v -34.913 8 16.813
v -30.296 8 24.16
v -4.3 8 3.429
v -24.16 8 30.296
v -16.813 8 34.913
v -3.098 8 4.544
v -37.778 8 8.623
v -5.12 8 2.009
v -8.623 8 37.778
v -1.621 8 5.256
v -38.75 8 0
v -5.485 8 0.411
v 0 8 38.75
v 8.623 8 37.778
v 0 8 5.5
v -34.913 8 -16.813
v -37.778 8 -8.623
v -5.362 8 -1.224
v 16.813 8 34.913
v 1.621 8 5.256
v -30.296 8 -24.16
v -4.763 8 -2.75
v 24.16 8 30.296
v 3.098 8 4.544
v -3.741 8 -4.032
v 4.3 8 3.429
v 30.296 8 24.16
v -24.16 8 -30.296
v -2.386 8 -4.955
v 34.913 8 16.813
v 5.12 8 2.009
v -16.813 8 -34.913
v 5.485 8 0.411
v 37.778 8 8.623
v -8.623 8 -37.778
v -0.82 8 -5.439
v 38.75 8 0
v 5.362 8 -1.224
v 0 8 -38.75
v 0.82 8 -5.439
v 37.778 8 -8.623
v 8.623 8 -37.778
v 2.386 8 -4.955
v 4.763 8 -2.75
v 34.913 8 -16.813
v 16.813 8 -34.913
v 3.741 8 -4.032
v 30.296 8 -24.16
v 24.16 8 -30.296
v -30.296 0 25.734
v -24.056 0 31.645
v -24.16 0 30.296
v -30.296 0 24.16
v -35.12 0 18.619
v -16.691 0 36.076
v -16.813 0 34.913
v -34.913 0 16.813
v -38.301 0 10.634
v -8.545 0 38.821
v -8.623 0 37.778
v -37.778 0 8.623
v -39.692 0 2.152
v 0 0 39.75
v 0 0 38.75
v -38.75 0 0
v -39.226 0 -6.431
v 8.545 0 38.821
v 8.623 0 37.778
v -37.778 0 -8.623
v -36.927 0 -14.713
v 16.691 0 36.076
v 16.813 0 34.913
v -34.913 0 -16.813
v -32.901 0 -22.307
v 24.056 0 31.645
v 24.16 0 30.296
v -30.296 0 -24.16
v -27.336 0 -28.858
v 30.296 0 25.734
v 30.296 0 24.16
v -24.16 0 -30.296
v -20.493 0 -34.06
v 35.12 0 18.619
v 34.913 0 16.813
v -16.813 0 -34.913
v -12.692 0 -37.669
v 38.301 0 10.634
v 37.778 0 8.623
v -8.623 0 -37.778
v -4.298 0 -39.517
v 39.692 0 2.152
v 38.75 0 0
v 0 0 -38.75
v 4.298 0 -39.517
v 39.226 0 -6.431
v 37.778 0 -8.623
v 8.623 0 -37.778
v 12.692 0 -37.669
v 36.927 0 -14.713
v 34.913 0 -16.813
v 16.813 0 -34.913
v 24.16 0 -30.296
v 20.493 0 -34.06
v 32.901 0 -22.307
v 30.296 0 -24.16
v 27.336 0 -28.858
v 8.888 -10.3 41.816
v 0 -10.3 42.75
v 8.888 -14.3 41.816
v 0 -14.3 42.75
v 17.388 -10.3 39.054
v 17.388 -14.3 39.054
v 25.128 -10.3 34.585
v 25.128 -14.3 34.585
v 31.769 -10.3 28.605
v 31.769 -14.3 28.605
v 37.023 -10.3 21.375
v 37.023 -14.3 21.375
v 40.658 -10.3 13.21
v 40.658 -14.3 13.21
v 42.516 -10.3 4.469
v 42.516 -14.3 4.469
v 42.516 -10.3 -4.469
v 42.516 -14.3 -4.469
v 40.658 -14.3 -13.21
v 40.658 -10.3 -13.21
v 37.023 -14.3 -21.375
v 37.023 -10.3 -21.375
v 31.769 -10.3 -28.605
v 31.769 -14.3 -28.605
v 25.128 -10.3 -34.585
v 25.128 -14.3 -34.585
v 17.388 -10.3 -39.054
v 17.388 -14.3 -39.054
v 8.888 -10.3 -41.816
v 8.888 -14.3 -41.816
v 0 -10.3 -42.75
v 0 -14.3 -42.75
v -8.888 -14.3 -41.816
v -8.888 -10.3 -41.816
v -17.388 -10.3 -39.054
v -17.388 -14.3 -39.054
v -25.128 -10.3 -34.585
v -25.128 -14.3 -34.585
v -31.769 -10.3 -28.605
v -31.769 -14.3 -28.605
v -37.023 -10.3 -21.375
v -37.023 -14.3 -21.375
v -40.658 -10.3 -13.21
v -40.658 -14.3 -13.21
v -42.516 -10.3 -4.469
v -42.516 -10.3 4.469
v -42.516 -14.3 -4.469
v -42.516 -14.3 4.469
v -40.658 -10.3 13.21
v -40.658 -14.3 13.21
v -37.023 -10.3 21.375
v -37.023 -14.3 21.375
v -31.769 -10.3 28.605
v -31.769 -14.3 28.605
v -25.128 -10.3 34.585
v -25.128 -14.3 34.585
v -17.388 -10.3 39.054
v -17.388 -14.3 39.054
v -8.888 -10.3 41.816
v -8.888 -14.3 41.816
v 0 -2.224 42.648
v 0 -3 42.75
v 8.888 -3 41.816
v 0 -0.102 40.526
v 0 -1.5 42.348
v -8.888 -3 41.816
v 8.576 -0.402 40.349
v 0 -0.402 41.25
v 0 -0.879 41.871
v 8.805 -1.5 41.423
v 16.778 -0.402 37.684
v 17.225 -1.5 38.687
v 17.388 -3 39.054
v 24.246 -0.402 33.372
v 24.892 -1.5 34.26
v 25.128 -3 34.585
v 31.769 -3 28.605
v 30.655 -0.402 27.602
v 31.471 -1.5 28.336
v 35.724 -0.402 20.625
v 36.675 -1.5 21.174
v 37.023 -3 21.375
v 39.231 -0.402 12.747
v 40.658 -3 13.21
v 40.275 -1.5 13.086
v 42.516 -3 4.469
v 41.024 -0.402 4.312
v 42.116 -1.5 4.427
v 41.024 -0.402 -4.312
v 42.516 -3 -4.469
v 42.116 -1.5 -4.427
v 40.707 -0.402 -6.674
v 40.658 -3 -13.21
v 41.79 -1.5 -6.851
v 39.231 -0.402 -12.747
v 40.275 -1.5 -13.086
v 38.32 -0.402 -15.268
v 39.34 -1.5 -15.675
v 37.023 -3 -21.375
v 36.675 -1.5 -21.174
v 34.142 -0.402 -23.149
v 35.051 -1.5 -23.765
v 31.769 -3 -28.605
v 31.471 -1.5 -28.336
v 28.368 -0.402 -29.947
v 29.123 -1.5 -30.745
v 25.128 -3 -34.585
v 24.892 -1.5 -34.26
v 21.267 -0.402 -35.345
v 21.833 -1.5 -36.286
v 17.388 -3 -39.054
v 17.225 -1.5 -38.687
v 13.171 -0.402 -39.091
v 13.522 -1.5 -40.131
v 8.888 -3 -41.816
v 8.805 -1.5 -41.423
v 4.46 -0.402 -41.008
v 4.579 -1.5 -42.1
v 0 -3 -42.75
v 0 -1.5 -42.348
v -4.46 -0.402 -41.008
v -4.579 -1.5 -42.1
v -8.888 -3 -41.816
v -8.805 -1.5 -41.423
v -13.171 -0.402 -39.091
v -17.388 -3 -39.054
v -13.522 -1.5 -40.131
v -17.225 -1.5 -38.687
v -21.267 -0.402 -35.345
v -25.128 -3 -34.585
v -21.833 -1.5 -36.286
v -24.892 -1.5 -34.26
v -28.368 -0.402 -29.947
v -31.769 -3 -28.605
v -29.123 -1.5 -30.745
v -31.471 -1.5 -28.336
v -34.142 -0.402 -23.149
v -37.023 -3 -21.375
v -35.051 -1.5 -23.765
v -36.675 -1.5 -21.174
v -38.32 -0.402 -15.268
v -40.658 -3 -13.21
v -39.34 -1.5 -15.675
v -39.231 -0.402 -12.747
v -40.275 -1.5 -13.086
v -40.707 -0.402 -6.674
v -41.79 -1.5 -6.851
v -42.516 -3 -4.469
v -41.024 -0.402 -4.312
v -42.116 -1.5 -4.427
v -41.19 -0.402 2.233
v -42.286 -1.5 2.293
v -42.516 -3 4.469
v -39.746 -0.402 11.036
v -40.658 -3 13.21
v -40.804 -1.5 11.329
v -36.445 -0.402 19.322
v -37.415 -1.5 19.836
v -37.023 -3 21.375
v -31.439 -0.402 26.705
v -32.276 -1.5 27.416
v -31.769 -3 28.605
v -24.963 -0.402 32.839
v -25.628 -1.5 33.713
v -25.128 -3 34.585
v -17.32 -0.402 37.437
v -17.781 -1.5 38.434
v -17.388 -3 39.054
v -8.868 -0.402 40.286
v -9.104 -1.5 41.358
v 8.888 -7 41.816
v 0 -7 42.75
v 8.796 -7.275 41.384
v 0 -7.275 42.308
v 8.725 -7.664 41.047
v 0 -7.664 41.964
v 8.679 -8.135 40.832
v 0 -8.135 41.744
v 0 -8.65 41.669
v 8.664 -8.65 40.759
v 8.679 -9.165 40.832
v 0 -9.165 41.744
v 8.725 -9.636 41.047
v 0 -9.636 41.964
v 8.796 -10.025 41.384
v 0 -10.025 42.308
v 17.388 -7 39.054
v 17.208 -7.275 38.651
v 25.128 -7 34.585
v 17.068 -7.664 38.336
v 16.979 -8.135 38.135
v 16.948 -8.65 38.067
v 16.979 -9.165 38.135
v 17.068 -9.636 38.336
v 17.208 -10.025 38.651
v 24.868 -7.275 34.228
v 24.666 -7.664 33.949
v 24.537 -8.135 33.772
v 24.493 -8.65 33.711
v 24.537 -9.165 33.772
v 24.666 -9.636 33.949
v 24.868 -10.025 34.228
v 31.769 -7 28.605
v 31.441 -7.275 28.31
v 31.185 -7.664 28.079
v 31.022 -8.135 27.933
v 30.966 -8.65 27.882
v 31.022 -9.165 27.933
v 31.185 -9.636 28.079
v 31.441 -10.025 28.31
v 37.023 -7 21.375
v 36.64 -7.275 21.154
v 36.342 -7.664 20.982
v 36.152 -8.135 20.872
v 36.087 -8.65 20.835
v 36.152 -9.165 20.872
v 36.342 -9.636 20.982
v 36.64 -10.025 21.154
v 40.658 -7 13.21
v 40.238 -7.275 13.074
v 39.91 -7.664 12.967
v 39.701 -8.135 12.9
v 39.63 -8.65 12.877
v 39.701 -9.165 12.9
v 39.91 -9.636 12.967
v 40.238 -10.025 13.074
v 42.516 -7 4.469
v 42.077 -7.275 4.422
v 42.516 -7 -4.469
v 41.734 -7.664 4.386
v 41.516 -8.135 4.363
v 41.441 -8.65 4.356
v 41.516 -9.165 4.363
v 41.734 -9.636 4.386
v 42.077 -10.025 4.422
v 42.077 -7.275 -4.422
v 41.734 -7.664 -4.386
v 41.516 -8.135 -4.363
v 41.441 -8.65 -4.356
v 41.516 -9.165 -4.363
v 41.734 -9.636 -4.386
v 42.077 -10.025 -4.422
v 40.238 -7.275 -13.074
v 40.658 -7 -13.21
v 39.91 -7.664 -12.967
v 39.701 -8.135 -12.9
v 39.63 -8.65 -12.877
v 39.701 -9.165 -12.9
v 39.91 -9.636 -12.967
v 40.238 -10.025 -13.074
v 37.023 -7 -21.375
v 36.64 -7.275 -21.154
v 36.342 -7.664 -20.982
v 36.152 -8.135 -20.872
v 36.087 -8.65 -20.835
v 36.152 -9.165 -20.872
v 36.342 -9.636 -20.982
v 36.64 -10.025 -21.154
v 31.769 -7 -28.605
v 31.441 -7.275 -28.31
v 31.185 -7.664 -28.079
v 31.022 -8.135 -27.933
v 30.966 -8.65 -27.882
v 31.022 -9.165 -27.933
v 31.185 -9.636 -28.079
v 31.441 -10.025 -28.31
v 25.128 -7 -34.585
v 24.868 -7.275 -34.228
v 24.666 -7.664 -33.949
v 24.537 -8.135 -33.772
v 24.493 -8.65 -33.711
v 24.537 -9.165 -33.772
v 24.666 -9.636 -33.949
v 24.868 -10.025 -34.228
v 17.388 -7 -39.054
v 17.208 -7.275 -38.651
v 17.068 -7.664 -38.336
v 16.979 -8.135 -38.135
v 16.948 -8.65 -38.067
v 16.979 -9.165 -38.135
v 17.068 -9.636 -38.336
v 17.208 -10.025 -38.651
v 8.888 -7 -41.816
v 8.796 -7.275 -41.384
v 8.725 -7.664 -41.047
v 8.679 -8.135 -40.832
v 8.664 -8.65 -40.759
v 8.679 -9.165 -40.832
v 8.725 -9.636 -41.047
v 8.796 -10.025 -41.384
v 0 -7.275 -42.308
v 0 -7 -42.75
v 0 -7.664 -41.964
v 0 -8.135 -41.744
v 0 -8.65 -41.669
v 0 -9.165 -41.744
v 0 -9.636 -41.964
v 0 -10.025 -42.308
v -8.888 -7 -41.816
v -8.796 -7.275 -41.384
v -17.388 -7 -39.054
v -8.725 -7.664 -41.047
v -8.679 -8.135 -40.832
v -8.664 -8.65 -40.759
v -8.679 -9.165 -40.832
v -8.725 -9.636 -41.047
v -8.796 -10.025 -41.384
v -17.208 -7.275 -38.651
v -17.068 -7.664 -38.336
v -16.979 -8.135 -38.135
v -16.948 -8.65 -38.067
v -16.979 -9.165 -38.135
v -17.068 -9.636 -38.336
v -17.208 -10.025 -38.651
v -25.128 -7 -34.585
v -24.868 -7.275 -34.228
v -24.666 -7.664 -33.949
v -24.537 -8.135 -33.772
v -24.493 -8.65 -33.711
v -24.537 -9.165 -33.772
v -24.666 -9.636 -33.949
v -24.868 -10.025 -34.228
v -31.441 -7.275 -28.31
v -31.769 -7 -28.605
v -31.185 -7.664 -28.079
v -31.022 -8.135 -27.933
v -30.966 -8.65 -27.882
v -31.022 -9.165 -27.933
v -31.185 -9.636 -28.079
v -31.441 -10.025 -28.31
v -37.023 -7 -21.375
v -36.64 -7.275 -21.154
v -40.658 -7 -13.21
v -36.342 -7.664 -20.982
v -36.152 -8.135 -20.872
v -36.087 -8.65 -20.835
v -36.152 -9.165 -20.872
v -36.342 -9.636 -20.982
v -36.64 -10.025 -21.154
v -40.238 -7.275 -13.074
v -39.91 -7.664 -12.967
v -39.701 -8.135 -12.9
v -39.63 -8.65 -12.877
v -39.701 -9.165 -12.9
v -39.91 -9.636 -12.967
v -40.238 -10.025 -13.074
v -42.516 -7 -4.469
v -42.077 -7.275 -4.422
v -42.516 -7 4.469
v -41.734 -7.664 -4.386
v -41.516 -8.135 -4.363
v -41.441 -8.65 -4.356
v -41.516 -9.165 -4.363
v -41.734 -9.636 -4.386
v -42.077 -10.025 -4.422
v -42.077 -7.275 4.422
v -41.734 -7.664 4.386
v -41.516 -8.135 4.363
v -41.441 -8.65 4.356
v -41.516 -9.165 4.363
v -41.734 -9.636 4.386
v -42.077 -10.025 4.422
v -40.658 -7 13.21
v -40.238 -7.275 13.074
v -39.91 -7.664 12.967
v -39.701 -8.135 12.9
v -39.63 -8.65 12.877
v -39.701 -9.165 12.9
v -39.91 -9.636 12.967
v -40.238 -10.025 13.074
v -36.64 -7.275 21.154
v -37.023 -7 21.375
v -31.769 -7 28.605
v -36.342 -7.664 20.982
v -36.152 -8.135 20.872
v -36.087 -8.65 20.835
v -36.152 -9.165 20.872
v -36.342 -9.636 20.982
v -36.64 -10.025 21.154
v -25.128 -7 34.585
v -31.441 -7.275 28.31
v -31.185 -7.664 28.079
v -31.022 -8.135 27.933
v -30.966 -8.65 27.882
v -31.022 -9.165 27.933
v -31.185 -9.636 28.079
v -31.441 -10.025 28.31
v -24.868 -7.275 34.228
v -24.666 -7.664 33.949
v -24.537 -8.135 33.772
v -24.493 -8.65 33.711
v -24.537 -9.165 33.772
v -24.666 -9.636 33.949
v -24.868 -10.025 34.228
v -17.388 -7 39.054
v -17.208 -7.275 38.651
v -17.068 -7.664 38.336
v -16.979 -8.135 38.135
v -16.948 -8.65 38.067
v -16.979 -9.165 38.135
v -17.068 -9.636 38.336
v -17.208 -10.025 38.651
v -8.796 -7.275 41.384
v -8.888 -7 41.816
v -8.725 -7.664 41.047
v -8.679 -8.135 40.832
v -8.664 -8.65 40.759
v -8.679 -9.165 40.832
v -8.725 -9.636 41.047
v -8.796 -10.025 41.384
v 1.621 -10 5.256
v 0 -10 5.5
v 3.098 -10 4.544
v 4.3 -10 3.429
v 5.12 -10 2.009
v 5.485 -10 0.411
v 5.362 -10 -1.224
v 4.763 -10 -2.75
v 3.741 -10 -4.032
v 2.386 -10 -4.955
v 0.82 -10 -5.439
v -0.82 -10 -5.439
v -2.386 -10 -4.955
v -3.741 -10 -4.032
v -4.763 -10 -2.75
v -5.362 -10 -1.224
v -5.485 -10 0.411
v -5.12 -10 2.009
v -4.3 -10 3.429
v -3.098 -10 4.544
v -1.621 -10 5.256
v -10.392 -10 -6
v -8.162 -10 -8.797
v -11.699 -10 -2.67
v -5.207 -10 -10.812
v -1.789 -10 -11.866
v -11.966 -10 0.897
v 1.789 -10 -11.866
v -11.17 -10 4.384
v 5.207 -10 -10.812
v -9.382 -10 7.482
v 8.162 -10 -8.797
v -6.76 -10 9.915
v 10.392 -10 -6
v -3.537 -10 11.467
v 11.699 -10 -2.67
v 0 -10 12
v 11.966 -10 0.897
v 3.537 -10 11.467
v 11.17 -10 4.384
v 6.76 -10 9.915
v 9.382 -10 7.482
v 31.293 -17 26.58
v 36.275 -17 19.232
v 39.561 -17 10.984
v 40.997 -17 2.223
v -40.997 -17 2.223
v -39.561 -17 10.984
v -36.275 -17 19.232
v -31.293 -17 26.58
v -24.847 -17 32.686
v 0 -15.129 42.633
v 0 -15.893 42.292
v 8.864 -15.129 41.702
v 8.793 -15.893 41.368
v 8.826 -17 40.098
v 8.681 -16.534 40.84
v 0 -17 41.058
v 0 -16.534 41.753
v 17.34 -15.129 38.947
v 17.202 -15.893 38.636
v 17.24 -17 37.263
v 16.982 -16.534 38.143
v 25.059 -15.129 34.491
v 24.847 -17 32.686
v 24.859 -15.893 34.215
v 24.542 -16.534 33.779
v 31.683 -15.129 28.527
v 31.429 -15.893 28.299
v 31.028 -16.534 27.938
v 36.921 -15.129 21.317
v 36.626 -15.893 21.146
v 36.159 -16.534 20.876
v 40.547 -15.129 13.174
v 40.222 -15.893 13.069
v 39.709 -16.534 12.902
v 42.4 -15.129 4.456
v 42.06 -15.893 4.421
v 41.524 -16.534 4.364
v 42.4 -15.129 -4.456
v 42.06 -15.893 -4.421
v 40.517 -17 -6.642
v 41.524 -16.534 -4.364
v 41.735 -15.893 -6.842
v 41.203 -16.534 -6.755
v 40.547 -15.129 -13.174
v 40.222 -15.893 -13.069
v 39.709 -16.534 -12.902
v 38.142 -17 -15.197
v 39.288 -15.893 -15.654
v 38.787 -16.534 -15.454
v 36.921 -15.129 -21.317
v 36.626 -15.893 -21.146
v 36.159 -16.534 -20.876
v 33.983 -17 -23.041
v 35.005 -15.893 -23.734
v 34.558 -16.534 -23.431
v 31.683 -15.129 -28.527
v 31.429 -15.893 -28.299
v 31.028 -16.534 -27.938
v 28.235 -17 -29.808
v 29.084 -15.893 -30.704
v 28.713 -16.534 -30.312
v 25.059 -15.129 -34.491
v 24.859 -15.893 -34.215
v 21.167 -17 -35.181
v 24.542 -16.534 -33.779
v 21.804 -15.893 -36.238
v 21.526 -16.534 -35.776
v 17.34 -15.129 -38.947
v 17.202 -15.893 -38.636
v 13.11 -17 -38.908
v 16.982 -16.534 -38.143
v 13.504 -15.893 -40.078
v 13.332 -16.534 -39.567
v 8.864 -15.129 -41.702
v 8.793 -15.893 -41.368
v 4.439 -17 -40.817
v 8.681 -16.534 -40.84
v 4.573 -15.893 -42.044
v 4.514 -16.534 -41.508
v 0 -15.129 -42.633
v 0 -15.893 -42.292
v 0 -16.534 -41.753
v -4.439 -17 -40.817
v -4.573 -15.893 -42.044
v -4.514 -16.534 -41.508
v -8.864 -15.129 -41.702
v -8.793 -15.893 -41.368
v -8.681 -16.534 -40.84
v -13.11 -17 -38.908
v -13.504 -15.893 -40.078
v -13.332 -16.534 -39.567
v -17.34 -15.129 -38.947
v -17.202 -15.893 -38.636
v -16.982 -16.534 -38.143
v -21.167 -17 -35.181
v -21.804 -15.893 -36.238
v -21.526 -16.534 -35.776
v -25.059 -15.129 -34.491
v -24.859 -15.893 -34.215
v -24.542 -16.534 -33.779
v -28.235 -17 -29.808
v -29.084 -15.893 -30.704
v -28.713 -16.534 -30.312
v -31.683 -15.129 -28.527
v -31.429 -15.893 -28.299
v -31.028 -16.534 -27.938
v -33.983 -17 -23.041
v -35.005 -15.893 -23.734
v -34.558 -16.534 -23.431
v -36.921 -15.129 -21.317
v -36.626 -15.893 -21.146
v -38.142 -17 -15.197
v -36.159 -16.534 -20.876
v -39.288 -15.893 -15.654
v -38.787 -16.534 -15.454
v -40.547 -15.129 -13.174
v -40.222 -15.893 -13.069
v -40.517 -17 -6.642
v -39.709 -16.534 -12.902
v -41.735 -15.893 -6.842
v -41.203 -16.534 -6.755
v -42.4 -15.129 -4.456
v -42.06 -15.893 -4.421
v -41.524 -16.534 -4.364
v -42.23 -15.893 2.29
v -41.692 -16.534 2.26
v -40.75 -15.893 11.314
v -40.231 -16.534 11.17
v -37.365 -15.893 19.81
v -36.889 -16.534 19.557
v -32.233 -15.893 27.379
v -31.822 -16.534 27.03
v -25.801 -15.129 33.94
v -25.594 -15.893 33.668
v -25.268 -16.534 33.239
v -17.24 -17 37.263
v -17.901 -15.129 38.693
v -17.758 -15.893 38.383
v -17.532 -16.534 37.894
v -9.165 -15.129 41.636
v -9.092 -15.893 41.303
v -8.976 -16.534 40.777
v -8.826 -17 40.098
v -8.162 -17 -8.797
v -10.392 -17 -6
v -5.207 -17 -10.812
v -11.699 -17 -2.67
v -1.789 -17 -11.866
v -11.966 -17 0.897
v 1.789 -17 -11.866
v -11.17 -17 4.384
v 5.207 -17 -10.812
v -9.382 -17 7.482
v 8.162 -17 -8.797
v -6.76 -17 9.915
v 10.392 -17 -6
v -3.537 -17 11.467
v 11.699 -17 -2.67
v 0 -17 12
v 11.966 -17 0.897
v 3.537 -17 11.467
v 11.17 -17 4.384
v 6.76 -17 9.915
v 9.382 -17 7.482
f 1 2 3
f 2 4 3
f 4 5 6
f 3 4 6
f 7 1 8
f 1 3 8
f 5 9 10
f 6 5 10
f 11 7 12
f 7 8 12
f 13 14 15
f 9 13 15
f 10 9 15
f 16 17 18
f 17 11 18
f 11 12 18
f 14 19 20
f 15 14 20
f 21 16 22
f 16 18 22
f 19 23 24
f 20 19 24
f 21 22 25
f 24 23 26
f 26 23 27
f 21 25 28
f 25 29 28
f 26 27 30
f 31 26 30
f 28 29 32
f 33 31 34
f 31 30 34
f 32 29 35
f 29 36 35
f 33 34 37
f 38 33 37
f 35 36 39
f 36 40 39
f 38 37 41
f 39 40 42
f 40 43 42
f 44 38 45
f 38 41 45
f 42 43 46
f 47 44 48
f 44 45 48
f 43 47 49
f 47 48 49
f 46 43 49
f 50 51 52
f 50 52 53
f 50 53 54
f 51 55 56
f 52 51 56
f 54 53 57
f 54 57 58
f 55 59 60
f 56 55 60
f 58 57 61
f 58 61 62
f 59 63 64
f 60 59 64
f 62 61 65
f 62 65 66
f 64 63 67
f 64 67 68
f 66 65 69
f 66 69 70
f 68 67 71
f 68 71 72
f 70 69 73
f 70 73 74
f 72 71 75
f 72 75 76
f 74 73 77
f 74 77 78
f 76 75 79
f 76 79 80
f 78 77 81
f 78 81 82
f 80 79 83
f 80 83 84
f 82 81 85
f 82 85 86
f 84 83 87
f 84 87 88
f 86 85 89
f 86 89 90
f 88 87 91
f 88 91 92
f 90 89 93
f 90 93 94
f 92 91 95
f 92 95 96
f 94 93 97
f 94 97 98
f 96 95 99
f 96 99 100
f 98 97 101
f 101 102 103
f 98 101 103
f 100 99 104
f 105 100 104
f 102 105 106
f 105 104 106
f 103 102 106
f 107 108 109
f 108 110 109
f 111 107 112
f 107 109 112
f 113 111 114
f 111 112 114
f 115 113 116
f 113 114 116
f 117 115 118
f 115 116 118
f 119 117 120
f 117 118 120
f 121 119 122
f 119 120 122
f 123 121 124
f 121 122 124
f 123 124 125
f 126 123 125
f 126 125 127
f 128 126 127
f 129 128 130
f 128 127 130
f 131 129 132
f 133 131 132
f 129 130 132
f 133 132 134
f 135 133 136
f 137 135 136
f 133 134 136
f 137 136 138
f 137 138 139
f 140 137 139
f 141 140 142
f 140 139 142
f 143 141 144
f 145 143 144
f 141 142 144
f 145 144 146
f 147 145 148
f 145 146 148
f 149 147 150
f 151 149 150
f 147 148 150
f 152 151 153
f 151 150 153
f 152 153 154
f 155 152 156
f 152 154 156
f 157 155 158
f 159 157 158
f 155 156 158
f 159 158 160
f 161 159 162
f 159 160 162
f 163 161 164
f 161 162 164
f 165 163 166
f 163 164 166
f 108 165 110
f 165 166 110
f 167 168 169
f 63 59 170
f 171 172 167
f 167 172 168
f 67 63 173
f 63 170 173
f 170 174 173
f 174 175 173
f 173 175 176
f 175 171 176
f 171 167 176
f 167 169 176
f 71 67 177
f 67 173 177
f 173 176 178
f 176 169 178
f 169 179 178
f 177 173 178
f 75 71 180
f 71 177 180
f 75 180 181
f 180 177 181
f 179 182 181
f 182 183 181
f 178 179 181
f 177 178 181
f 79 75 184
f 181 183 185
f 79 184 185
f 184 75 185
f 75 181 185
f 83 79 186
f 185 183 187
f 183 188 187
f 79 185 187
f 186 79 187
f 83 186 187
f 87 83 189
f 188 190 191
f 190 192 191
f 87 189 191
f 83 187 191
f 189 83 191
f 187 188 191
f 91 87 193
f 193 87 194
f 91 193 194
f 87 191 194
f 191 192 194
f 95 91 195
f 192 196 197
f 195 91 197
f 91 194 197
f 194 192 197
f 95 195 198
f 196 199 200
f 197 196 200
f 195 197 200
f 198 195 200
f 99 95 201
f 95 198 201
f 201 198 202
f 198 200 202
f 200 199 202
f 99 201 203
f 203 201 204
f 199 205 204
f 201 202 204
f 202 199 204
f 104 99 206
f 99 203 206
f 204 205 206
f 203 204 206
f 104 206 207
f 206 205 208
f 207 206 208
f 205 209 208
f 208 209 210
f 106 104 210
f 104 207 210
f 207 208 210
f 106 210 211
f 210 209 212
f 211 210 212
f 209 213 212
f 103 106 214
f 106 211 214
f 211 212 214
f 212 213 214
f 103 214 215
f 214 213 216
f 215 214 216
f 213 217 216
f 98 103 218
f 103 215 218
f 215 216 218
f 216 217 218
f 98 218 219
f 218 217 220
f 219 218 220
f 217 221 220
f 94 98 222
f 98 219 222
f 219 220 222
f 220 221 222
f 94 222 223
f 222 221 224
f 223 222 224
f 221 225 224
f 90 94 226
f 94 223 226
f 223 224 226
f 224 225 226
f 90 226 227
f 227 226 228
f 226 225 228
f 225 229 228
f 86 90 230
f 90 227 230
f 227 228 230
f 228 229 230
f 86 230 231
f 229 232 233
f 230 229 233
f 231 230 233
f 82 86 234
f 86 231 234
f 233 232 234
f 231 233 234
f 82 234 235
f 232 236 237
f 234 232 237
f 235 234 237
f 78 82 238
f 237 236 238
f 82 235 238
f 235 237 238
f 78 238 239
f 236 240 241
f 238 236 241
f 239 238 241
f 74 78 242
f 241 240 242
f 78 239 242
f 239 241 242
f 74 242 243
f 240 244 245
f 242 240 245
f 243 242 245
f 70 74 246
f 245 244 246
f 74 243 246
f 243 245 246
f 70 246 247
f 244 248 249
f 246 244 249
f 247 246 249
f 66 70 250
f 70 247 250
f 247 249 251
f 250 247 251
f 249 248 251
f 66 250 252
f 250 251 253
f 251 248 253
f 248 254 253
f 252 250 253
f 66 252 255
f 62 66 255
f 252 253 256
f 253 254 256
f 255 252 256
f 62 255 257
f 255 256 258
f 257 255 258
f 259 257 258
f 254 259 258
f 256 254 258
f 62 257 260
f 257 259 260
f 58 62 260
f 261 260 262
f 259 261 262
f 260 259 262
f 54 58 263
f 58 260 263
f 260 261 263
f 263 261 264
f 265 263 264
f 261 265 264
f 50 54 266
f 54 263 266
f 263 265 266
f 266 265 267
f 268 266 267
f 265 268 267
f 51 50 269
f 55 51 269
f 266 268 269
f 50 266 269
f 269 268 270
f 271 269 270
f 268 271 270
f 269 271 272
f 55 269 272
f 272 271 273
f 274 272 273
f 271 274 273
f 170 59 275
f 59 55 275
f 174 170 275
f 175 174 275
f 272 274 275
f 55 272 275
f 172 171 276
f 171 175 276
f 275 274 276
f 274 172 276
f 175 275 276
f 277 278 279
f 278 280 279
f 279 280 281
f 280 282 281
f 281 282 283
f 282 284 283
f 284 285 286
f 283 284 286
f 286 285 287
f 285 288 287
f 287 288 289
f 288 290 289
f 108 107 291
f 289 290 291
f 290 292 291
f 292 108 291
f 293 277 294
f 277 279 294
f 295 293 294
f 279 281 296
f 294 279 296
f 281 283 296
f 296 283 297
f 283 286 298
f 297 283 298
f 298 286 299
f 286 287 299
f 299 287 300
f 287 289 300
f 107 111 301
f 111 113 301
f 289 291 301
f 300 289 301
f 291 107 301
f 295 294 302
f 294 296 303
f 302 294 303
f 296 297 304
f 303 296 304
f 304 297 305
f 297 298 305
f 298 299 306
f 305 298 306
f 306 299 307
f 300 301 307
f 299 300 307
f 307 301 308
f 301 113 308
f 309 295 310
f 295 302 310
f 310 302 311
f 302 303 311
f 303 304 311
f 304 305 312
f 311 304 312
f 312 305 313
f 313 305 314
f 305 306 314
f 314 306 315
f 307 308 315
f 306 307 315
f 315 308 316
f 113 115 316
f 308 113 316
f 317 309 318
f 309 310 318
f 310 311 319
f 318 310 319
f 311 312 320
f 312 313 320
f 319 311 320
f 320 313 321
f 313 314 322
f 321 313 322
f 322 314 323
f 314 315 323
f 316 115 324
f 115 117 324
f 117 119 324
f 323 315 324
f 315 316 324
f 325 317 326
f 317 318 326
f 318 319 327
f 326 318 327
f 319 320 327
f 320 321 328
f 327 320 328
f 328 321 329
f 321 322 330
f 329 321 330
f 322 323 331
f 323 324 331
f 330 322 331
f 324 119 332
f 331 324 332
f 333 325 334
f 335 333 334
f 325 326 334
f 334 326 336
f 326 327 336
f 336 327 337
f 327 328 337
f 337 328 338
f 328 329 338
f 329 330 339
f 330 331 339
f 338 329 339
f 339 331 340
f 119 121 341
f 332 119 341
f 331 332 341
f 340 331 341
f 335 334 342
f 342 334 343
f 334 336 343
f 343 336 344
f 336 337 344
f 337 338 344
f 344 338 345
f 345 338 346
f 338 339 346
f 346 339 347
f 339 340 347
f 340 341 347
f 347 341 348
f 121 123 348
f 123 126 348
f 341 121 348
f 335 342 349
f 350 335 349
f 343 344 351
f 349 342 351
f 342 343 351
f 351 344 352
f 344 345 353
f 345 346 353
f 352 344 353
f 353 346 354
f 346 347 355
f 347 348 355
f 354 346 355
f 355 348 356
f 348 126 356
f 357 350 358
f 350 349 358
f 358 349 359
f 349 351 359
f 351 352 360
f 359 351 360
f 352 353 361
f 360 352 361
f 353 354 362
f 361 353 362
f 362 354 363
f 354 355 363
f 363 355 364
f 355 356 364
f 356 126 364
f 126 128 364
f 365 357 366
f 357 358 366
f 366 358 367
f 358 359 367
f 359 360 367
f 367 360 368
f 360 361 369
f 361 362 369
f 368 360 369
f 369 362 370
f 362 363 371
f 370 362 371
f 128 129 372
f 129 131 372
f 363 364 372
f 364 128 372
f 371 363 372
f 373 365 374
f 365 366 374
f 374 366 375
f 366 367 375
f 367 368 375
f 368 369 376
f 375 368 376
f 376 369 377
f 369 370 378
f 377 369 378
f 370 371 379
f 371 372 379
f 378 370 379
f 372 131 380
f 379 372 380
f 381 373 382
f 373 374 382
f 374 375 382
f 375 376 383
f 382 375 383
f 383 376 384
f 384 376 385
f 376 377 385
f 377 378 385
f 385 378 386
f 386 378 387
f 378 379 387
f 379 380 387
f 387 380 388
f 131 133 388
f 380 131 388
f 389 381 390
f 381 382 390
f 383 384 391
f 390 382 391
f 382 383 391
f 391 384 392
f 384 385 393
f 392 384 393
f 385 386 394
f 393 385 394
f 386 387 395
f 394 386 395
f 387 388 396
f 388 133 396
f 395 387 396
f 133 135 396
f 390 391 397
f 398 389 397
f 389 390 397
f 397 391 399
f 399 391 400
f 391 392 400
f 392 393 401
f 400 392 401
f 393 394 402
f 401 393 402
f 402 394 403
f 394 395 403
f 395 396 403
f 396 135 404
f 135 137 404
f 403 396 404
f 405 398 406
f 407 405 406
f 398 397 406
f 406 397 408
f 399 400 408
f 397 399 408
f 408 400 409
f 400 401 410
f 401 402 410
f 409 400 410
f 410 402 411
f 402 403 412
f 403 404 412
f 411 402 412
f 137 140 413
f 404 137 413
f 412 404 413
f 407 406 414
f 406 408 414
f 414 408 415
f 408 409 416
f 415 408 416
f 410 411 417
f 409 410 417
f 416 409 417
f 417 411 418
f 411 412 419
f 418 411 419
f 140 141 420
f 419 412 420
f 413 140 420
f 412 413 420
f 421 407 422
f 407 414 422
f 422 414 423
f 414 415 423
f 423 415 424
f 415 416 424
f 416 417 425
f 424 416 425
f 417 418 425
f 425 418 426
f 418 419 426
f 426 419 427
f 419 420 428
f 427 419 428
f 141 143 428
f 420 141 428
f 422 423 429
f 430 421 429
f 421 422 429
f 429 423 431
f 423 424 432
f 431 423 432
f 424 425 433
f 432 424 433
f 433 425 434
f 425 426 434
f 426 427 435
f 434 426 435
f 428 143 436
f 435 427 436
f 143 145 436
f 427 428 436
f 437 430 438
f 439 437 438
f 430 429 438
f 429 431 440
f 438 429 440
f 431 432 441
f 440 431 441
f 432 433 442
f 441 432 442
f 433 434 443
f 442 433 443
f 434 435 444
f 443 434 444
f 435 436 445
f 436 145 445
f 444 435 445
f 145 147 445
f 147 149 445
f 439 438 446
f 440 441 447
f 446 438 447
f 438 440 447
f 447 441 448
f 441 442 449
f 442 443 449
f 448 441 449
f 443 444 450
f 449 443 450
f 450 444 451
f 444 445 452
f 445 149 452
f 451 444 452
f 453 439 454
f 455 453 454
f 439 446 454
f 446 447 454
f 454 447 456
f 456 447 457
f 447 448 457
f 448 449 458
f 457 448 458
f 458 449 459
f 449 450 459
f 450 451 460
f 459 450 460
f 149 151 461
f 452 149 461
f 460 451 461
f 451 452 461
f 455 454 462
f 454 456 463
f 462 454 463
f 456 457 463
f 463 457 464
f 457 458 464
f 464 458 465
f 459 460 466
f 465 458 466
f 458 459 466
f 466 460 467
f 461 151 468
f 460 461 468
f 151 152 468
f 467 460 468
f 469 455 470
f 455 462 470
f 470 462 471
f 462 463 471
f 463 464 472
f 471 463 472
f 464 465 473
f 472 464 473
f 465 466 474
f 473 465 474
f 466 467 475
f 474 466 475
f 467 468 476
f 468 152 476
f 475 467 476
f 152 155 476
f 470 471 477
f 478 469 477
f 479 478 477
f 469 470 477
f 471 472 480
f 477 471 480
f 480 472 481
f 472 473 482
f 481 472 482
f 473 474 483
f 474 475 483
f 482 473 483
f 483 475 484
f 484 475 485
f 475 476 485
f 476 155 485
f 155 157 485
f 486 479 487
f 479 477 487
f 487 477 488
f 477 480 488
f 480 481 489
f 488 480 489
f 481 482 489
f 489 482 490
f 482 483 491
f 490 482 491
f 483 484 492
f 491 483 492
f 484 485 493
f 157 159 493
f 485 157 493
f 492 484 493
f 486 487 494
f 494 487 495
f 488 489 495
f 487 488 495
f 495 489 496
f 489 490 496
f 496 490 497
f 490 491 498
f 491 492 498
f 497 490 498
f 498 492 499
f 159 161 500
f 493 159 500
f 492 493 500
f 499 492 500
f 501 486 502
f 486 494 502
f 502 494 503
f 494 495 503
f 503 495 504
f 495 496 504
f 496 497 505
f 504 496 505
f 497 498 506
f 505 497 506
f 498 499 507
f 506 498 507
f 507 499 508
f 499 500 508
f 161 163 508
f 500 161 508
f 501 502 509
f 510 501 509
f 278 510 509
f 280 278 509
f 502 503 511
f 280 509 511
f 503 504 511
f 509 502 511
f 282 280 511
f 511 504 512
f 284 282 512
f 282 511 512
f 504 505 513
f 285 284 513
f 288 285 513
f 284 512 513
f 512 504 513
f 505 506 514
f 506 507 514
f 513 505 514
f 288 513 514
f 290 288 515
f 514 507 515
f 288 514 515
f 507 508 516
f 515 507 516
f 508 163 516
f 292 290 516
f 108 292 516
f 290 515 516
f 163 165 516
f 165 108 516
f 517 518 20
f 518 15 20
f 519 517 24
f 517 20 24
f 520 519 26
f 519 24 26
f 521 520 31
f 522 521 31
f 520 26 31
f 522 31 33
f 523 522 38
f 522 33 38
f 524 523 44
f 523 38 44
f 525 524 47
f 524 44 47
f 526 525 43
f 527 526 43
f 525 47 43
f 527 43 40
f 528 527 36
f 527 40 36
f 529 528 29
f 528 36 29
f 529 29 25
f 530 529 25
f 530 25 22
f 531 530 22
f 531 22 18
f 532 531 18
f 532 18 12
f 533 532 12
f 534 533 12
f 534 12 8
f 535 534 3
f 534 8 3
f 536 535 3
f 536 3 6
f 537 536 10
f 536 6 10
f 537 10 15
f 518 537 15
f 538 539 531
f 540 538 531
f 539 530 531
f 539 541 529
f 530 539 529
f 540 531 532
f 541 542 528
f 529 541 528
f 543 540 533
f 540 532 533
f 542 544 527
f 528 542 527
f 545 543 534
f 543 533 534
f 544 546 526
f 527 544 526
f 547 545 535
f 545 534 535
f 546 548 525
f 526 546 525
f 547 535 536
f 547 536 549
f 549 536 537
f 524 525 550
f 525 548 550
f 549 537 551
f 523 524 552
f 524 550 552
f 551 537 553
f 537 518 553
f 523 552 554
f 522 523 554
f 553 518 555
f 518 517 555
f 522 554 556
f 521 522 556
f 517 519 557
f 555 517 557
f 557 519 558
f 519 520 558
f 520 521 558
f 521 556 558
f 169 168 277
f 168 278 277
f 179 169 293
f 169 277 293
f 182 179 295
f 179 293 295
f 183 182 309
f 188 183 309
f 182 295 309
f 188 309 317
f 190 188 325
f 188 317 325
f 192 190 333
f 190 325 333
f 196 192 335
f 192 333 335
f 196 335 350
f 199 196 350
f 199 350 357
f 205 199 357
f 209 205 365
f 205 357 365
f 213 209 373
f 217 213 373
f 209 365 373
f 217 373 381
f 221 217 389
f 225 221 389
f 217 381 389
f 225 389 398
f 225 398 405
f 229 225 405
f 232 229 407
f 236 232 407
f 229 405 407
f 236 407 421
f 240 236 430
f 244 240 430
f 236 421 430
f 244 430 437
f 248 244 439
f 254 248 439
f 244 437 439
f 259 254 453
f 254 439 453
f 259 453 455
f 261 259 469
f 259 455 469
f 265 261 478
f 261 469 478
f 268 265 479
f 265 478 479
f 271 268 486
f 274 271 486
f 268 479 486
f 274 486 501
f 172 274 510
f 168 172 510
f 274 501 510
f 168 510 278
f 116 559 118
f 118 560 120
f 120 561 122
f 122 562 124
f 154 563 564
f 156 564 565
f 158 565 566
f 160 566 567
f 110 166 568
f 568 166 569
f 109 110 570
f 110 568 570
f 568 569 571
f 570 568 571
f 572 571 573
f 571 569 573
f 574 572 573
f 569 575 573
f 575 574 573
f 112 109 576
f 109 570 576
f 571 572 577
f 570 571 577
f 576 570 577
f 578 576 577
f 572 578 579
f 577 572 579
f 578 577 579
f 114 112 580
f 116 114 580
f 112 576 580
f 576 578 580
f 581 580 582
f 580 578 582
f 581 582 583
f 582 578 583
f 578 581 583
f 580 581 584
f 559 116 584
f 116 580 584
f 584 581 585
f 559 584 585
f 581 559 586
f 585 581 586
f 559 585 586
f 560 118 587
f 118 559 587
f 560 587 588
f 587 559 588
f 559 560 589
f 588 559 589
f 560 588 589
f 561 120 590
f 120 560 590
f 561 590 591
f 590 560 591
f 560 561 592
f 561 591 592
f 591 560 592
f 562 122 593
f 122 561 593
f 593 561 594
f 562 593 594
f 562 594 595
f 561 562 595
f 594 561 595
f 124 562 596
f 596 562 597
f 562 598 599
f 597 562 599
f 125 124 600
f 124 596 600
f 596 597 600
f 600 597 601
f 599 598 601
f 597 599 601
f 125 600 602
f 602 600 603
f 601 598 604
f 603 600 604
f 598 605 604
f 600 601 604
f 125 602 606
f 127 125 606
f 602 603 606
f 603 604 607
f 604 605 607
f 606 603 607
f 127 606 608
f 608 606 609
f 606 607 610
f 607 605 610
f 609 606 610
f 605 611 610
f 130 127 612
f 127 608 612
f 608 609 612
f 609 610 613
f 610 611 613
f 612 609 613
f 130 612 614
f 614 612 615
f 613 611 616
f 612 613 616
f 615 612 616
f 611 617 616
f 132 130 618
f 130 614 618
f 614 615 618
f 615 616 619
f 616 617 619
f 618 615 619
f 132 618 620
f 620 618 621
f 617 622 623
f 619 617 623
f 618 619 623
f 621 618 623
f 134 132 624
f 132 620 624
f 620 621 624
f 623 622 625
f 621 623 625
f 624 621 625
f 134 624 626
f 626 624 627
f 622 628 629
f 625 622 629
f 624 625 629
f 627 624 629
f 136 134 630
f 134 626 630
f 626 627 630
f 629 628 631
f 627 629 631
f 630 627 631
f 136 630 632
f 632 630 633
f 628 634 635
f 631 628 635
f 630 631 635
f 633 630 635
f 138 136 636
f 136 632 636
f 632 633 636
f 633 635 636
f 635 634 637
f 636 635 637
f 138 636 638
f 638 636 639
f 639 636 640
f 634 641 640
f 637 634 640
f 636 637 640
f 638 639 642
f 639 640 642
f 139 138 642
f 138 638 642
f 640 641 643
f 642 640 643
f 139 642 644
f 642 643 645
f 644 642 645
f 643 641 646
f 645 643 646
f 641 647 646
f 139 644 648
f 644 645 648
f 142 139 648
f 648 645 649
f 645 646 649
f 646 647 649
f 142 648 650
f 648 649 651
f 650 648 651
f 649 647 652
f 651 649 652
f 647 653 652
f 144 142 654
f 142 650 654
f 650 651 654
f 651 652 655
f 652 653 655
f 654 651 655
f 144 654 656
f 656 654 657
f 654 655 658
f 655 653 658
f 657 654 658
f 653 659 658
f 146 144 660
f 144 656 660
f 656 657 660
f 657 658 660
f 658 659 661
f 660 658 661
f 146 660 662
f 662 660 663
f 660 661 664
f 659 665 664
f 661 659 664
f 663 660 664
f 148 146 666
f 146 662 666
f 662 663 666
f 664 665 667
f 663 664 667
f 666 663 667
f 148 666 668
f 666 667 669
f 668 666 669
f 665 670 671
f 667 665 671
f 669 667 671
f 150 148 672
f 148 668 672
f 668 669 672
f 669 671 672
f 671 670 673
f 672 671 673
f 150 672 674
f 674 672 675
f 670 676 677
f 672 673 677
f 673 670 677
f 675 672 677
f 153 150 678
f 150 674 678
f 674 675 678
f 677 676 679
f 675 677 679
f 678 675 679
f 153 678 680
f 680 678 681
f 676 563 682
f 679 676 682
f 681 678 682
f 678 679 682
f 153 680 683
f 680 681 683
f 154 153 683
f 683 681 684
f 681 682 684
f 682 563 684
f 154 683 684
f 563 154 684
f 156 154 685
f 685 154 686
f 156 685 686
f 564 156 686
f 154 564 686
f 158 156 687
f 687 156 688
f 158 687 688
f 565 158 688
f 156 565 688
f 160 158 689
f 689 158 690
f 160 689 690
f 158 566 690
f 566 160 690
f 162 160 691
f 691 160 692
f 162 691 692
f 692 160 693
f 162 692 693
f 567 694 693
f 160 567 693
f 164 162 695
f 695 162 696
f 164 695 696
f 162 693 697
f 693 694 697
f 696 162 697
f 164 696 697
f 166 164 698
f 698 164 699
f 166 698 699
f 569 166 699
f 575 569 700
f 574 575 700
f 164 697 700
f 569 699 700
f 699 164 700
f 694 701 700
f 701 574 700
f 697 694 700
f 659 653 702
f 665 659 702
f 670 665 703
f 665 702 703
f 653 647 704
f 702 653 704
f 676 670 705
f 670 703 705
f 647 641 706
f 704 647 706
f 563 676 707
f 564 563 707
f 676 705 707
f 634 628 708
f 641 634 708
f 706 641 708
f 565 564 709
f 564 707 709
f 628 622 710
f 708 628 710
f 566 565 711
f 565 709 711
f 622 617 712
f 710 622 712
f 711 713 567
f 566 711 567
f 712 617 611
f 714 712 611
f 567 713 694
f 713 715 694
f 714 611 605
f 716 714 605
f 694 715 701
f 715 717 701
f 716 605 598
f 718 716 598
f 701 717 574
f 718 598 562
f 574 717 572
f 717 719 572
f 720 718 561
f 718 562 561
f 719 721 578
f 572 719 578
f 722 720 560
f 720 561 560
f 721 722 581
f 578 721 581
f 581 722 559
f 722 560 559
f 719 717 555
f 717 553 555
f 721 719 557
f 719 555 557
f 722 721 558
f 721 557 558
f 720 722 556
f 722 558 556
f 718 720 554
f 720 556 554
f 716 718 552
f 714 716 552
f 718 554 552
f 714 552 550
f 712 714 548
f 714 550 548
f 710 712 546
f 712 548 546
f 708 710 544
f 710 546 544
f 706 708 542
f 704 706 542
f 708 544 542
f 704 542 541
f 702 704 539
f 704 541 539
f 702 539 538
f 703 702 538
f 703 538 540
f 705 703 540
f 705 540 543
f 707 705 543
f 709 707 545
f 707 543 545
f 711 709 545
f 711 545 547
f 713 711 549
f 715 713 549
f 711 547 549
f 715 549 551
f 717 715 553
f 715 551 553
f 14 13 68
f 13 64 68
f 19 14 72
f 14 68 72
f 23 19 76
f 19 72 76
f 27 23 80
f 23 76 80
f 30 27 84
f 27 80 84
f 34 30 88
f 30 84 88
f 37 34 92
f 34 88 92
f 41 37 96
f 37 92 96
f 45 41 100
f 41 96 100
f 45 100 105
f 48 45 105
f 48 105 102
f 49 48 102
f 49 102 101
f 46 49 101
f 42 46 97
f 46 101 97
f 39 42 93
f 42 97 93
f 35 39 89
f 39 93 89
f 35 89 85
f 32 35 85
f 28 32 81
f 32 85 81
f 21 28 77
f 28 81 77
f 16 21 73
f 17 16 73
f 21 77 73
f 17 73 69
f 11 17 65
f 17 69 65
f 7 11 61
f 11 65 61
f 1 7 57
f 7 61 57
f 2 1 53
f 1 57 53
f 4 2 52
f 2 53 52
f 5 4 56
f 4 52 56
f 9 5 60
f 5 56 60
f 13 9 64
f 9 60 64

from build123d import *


with BuildPart() as f1:
    # F0 (on Right) → F1 (revolve)
    with BuildSketch(Plane.YZ):
        with BuildLine():
            Line((8, 38.75), (0, 38.75))
            Line((0, 38.75), (0, 39.75))
            ThreePointArc((0, 39.75), (-0.87868, 41.87132), (-3, 42.75))
            Line((-3, 42.75), (-7, 42.75))
            ThreePointArc((-7, 42.75), (-8.65, 41.669375), (-10.3, 42.75))
            Line((-10.3, 42.75), (-14.3, 42.75))
            ThreePointArc((-14.3, 42.75), (-15.893266, 42.291949), (-17, 41.05767))
            Line((-17, 41.05767), (-17, 12))
            Line((-17, 12), (-10, 12))
            Line((-10, 12), (-10, 5.5))
            Line((-10, 5.5), (8, 5.5))
            Line((8, 5.5), (8, 38.75))
        make_face()
    revolve(axis=Axis((0, 0.134684, 0), (0, 1, 0)))


solid = f1.part
